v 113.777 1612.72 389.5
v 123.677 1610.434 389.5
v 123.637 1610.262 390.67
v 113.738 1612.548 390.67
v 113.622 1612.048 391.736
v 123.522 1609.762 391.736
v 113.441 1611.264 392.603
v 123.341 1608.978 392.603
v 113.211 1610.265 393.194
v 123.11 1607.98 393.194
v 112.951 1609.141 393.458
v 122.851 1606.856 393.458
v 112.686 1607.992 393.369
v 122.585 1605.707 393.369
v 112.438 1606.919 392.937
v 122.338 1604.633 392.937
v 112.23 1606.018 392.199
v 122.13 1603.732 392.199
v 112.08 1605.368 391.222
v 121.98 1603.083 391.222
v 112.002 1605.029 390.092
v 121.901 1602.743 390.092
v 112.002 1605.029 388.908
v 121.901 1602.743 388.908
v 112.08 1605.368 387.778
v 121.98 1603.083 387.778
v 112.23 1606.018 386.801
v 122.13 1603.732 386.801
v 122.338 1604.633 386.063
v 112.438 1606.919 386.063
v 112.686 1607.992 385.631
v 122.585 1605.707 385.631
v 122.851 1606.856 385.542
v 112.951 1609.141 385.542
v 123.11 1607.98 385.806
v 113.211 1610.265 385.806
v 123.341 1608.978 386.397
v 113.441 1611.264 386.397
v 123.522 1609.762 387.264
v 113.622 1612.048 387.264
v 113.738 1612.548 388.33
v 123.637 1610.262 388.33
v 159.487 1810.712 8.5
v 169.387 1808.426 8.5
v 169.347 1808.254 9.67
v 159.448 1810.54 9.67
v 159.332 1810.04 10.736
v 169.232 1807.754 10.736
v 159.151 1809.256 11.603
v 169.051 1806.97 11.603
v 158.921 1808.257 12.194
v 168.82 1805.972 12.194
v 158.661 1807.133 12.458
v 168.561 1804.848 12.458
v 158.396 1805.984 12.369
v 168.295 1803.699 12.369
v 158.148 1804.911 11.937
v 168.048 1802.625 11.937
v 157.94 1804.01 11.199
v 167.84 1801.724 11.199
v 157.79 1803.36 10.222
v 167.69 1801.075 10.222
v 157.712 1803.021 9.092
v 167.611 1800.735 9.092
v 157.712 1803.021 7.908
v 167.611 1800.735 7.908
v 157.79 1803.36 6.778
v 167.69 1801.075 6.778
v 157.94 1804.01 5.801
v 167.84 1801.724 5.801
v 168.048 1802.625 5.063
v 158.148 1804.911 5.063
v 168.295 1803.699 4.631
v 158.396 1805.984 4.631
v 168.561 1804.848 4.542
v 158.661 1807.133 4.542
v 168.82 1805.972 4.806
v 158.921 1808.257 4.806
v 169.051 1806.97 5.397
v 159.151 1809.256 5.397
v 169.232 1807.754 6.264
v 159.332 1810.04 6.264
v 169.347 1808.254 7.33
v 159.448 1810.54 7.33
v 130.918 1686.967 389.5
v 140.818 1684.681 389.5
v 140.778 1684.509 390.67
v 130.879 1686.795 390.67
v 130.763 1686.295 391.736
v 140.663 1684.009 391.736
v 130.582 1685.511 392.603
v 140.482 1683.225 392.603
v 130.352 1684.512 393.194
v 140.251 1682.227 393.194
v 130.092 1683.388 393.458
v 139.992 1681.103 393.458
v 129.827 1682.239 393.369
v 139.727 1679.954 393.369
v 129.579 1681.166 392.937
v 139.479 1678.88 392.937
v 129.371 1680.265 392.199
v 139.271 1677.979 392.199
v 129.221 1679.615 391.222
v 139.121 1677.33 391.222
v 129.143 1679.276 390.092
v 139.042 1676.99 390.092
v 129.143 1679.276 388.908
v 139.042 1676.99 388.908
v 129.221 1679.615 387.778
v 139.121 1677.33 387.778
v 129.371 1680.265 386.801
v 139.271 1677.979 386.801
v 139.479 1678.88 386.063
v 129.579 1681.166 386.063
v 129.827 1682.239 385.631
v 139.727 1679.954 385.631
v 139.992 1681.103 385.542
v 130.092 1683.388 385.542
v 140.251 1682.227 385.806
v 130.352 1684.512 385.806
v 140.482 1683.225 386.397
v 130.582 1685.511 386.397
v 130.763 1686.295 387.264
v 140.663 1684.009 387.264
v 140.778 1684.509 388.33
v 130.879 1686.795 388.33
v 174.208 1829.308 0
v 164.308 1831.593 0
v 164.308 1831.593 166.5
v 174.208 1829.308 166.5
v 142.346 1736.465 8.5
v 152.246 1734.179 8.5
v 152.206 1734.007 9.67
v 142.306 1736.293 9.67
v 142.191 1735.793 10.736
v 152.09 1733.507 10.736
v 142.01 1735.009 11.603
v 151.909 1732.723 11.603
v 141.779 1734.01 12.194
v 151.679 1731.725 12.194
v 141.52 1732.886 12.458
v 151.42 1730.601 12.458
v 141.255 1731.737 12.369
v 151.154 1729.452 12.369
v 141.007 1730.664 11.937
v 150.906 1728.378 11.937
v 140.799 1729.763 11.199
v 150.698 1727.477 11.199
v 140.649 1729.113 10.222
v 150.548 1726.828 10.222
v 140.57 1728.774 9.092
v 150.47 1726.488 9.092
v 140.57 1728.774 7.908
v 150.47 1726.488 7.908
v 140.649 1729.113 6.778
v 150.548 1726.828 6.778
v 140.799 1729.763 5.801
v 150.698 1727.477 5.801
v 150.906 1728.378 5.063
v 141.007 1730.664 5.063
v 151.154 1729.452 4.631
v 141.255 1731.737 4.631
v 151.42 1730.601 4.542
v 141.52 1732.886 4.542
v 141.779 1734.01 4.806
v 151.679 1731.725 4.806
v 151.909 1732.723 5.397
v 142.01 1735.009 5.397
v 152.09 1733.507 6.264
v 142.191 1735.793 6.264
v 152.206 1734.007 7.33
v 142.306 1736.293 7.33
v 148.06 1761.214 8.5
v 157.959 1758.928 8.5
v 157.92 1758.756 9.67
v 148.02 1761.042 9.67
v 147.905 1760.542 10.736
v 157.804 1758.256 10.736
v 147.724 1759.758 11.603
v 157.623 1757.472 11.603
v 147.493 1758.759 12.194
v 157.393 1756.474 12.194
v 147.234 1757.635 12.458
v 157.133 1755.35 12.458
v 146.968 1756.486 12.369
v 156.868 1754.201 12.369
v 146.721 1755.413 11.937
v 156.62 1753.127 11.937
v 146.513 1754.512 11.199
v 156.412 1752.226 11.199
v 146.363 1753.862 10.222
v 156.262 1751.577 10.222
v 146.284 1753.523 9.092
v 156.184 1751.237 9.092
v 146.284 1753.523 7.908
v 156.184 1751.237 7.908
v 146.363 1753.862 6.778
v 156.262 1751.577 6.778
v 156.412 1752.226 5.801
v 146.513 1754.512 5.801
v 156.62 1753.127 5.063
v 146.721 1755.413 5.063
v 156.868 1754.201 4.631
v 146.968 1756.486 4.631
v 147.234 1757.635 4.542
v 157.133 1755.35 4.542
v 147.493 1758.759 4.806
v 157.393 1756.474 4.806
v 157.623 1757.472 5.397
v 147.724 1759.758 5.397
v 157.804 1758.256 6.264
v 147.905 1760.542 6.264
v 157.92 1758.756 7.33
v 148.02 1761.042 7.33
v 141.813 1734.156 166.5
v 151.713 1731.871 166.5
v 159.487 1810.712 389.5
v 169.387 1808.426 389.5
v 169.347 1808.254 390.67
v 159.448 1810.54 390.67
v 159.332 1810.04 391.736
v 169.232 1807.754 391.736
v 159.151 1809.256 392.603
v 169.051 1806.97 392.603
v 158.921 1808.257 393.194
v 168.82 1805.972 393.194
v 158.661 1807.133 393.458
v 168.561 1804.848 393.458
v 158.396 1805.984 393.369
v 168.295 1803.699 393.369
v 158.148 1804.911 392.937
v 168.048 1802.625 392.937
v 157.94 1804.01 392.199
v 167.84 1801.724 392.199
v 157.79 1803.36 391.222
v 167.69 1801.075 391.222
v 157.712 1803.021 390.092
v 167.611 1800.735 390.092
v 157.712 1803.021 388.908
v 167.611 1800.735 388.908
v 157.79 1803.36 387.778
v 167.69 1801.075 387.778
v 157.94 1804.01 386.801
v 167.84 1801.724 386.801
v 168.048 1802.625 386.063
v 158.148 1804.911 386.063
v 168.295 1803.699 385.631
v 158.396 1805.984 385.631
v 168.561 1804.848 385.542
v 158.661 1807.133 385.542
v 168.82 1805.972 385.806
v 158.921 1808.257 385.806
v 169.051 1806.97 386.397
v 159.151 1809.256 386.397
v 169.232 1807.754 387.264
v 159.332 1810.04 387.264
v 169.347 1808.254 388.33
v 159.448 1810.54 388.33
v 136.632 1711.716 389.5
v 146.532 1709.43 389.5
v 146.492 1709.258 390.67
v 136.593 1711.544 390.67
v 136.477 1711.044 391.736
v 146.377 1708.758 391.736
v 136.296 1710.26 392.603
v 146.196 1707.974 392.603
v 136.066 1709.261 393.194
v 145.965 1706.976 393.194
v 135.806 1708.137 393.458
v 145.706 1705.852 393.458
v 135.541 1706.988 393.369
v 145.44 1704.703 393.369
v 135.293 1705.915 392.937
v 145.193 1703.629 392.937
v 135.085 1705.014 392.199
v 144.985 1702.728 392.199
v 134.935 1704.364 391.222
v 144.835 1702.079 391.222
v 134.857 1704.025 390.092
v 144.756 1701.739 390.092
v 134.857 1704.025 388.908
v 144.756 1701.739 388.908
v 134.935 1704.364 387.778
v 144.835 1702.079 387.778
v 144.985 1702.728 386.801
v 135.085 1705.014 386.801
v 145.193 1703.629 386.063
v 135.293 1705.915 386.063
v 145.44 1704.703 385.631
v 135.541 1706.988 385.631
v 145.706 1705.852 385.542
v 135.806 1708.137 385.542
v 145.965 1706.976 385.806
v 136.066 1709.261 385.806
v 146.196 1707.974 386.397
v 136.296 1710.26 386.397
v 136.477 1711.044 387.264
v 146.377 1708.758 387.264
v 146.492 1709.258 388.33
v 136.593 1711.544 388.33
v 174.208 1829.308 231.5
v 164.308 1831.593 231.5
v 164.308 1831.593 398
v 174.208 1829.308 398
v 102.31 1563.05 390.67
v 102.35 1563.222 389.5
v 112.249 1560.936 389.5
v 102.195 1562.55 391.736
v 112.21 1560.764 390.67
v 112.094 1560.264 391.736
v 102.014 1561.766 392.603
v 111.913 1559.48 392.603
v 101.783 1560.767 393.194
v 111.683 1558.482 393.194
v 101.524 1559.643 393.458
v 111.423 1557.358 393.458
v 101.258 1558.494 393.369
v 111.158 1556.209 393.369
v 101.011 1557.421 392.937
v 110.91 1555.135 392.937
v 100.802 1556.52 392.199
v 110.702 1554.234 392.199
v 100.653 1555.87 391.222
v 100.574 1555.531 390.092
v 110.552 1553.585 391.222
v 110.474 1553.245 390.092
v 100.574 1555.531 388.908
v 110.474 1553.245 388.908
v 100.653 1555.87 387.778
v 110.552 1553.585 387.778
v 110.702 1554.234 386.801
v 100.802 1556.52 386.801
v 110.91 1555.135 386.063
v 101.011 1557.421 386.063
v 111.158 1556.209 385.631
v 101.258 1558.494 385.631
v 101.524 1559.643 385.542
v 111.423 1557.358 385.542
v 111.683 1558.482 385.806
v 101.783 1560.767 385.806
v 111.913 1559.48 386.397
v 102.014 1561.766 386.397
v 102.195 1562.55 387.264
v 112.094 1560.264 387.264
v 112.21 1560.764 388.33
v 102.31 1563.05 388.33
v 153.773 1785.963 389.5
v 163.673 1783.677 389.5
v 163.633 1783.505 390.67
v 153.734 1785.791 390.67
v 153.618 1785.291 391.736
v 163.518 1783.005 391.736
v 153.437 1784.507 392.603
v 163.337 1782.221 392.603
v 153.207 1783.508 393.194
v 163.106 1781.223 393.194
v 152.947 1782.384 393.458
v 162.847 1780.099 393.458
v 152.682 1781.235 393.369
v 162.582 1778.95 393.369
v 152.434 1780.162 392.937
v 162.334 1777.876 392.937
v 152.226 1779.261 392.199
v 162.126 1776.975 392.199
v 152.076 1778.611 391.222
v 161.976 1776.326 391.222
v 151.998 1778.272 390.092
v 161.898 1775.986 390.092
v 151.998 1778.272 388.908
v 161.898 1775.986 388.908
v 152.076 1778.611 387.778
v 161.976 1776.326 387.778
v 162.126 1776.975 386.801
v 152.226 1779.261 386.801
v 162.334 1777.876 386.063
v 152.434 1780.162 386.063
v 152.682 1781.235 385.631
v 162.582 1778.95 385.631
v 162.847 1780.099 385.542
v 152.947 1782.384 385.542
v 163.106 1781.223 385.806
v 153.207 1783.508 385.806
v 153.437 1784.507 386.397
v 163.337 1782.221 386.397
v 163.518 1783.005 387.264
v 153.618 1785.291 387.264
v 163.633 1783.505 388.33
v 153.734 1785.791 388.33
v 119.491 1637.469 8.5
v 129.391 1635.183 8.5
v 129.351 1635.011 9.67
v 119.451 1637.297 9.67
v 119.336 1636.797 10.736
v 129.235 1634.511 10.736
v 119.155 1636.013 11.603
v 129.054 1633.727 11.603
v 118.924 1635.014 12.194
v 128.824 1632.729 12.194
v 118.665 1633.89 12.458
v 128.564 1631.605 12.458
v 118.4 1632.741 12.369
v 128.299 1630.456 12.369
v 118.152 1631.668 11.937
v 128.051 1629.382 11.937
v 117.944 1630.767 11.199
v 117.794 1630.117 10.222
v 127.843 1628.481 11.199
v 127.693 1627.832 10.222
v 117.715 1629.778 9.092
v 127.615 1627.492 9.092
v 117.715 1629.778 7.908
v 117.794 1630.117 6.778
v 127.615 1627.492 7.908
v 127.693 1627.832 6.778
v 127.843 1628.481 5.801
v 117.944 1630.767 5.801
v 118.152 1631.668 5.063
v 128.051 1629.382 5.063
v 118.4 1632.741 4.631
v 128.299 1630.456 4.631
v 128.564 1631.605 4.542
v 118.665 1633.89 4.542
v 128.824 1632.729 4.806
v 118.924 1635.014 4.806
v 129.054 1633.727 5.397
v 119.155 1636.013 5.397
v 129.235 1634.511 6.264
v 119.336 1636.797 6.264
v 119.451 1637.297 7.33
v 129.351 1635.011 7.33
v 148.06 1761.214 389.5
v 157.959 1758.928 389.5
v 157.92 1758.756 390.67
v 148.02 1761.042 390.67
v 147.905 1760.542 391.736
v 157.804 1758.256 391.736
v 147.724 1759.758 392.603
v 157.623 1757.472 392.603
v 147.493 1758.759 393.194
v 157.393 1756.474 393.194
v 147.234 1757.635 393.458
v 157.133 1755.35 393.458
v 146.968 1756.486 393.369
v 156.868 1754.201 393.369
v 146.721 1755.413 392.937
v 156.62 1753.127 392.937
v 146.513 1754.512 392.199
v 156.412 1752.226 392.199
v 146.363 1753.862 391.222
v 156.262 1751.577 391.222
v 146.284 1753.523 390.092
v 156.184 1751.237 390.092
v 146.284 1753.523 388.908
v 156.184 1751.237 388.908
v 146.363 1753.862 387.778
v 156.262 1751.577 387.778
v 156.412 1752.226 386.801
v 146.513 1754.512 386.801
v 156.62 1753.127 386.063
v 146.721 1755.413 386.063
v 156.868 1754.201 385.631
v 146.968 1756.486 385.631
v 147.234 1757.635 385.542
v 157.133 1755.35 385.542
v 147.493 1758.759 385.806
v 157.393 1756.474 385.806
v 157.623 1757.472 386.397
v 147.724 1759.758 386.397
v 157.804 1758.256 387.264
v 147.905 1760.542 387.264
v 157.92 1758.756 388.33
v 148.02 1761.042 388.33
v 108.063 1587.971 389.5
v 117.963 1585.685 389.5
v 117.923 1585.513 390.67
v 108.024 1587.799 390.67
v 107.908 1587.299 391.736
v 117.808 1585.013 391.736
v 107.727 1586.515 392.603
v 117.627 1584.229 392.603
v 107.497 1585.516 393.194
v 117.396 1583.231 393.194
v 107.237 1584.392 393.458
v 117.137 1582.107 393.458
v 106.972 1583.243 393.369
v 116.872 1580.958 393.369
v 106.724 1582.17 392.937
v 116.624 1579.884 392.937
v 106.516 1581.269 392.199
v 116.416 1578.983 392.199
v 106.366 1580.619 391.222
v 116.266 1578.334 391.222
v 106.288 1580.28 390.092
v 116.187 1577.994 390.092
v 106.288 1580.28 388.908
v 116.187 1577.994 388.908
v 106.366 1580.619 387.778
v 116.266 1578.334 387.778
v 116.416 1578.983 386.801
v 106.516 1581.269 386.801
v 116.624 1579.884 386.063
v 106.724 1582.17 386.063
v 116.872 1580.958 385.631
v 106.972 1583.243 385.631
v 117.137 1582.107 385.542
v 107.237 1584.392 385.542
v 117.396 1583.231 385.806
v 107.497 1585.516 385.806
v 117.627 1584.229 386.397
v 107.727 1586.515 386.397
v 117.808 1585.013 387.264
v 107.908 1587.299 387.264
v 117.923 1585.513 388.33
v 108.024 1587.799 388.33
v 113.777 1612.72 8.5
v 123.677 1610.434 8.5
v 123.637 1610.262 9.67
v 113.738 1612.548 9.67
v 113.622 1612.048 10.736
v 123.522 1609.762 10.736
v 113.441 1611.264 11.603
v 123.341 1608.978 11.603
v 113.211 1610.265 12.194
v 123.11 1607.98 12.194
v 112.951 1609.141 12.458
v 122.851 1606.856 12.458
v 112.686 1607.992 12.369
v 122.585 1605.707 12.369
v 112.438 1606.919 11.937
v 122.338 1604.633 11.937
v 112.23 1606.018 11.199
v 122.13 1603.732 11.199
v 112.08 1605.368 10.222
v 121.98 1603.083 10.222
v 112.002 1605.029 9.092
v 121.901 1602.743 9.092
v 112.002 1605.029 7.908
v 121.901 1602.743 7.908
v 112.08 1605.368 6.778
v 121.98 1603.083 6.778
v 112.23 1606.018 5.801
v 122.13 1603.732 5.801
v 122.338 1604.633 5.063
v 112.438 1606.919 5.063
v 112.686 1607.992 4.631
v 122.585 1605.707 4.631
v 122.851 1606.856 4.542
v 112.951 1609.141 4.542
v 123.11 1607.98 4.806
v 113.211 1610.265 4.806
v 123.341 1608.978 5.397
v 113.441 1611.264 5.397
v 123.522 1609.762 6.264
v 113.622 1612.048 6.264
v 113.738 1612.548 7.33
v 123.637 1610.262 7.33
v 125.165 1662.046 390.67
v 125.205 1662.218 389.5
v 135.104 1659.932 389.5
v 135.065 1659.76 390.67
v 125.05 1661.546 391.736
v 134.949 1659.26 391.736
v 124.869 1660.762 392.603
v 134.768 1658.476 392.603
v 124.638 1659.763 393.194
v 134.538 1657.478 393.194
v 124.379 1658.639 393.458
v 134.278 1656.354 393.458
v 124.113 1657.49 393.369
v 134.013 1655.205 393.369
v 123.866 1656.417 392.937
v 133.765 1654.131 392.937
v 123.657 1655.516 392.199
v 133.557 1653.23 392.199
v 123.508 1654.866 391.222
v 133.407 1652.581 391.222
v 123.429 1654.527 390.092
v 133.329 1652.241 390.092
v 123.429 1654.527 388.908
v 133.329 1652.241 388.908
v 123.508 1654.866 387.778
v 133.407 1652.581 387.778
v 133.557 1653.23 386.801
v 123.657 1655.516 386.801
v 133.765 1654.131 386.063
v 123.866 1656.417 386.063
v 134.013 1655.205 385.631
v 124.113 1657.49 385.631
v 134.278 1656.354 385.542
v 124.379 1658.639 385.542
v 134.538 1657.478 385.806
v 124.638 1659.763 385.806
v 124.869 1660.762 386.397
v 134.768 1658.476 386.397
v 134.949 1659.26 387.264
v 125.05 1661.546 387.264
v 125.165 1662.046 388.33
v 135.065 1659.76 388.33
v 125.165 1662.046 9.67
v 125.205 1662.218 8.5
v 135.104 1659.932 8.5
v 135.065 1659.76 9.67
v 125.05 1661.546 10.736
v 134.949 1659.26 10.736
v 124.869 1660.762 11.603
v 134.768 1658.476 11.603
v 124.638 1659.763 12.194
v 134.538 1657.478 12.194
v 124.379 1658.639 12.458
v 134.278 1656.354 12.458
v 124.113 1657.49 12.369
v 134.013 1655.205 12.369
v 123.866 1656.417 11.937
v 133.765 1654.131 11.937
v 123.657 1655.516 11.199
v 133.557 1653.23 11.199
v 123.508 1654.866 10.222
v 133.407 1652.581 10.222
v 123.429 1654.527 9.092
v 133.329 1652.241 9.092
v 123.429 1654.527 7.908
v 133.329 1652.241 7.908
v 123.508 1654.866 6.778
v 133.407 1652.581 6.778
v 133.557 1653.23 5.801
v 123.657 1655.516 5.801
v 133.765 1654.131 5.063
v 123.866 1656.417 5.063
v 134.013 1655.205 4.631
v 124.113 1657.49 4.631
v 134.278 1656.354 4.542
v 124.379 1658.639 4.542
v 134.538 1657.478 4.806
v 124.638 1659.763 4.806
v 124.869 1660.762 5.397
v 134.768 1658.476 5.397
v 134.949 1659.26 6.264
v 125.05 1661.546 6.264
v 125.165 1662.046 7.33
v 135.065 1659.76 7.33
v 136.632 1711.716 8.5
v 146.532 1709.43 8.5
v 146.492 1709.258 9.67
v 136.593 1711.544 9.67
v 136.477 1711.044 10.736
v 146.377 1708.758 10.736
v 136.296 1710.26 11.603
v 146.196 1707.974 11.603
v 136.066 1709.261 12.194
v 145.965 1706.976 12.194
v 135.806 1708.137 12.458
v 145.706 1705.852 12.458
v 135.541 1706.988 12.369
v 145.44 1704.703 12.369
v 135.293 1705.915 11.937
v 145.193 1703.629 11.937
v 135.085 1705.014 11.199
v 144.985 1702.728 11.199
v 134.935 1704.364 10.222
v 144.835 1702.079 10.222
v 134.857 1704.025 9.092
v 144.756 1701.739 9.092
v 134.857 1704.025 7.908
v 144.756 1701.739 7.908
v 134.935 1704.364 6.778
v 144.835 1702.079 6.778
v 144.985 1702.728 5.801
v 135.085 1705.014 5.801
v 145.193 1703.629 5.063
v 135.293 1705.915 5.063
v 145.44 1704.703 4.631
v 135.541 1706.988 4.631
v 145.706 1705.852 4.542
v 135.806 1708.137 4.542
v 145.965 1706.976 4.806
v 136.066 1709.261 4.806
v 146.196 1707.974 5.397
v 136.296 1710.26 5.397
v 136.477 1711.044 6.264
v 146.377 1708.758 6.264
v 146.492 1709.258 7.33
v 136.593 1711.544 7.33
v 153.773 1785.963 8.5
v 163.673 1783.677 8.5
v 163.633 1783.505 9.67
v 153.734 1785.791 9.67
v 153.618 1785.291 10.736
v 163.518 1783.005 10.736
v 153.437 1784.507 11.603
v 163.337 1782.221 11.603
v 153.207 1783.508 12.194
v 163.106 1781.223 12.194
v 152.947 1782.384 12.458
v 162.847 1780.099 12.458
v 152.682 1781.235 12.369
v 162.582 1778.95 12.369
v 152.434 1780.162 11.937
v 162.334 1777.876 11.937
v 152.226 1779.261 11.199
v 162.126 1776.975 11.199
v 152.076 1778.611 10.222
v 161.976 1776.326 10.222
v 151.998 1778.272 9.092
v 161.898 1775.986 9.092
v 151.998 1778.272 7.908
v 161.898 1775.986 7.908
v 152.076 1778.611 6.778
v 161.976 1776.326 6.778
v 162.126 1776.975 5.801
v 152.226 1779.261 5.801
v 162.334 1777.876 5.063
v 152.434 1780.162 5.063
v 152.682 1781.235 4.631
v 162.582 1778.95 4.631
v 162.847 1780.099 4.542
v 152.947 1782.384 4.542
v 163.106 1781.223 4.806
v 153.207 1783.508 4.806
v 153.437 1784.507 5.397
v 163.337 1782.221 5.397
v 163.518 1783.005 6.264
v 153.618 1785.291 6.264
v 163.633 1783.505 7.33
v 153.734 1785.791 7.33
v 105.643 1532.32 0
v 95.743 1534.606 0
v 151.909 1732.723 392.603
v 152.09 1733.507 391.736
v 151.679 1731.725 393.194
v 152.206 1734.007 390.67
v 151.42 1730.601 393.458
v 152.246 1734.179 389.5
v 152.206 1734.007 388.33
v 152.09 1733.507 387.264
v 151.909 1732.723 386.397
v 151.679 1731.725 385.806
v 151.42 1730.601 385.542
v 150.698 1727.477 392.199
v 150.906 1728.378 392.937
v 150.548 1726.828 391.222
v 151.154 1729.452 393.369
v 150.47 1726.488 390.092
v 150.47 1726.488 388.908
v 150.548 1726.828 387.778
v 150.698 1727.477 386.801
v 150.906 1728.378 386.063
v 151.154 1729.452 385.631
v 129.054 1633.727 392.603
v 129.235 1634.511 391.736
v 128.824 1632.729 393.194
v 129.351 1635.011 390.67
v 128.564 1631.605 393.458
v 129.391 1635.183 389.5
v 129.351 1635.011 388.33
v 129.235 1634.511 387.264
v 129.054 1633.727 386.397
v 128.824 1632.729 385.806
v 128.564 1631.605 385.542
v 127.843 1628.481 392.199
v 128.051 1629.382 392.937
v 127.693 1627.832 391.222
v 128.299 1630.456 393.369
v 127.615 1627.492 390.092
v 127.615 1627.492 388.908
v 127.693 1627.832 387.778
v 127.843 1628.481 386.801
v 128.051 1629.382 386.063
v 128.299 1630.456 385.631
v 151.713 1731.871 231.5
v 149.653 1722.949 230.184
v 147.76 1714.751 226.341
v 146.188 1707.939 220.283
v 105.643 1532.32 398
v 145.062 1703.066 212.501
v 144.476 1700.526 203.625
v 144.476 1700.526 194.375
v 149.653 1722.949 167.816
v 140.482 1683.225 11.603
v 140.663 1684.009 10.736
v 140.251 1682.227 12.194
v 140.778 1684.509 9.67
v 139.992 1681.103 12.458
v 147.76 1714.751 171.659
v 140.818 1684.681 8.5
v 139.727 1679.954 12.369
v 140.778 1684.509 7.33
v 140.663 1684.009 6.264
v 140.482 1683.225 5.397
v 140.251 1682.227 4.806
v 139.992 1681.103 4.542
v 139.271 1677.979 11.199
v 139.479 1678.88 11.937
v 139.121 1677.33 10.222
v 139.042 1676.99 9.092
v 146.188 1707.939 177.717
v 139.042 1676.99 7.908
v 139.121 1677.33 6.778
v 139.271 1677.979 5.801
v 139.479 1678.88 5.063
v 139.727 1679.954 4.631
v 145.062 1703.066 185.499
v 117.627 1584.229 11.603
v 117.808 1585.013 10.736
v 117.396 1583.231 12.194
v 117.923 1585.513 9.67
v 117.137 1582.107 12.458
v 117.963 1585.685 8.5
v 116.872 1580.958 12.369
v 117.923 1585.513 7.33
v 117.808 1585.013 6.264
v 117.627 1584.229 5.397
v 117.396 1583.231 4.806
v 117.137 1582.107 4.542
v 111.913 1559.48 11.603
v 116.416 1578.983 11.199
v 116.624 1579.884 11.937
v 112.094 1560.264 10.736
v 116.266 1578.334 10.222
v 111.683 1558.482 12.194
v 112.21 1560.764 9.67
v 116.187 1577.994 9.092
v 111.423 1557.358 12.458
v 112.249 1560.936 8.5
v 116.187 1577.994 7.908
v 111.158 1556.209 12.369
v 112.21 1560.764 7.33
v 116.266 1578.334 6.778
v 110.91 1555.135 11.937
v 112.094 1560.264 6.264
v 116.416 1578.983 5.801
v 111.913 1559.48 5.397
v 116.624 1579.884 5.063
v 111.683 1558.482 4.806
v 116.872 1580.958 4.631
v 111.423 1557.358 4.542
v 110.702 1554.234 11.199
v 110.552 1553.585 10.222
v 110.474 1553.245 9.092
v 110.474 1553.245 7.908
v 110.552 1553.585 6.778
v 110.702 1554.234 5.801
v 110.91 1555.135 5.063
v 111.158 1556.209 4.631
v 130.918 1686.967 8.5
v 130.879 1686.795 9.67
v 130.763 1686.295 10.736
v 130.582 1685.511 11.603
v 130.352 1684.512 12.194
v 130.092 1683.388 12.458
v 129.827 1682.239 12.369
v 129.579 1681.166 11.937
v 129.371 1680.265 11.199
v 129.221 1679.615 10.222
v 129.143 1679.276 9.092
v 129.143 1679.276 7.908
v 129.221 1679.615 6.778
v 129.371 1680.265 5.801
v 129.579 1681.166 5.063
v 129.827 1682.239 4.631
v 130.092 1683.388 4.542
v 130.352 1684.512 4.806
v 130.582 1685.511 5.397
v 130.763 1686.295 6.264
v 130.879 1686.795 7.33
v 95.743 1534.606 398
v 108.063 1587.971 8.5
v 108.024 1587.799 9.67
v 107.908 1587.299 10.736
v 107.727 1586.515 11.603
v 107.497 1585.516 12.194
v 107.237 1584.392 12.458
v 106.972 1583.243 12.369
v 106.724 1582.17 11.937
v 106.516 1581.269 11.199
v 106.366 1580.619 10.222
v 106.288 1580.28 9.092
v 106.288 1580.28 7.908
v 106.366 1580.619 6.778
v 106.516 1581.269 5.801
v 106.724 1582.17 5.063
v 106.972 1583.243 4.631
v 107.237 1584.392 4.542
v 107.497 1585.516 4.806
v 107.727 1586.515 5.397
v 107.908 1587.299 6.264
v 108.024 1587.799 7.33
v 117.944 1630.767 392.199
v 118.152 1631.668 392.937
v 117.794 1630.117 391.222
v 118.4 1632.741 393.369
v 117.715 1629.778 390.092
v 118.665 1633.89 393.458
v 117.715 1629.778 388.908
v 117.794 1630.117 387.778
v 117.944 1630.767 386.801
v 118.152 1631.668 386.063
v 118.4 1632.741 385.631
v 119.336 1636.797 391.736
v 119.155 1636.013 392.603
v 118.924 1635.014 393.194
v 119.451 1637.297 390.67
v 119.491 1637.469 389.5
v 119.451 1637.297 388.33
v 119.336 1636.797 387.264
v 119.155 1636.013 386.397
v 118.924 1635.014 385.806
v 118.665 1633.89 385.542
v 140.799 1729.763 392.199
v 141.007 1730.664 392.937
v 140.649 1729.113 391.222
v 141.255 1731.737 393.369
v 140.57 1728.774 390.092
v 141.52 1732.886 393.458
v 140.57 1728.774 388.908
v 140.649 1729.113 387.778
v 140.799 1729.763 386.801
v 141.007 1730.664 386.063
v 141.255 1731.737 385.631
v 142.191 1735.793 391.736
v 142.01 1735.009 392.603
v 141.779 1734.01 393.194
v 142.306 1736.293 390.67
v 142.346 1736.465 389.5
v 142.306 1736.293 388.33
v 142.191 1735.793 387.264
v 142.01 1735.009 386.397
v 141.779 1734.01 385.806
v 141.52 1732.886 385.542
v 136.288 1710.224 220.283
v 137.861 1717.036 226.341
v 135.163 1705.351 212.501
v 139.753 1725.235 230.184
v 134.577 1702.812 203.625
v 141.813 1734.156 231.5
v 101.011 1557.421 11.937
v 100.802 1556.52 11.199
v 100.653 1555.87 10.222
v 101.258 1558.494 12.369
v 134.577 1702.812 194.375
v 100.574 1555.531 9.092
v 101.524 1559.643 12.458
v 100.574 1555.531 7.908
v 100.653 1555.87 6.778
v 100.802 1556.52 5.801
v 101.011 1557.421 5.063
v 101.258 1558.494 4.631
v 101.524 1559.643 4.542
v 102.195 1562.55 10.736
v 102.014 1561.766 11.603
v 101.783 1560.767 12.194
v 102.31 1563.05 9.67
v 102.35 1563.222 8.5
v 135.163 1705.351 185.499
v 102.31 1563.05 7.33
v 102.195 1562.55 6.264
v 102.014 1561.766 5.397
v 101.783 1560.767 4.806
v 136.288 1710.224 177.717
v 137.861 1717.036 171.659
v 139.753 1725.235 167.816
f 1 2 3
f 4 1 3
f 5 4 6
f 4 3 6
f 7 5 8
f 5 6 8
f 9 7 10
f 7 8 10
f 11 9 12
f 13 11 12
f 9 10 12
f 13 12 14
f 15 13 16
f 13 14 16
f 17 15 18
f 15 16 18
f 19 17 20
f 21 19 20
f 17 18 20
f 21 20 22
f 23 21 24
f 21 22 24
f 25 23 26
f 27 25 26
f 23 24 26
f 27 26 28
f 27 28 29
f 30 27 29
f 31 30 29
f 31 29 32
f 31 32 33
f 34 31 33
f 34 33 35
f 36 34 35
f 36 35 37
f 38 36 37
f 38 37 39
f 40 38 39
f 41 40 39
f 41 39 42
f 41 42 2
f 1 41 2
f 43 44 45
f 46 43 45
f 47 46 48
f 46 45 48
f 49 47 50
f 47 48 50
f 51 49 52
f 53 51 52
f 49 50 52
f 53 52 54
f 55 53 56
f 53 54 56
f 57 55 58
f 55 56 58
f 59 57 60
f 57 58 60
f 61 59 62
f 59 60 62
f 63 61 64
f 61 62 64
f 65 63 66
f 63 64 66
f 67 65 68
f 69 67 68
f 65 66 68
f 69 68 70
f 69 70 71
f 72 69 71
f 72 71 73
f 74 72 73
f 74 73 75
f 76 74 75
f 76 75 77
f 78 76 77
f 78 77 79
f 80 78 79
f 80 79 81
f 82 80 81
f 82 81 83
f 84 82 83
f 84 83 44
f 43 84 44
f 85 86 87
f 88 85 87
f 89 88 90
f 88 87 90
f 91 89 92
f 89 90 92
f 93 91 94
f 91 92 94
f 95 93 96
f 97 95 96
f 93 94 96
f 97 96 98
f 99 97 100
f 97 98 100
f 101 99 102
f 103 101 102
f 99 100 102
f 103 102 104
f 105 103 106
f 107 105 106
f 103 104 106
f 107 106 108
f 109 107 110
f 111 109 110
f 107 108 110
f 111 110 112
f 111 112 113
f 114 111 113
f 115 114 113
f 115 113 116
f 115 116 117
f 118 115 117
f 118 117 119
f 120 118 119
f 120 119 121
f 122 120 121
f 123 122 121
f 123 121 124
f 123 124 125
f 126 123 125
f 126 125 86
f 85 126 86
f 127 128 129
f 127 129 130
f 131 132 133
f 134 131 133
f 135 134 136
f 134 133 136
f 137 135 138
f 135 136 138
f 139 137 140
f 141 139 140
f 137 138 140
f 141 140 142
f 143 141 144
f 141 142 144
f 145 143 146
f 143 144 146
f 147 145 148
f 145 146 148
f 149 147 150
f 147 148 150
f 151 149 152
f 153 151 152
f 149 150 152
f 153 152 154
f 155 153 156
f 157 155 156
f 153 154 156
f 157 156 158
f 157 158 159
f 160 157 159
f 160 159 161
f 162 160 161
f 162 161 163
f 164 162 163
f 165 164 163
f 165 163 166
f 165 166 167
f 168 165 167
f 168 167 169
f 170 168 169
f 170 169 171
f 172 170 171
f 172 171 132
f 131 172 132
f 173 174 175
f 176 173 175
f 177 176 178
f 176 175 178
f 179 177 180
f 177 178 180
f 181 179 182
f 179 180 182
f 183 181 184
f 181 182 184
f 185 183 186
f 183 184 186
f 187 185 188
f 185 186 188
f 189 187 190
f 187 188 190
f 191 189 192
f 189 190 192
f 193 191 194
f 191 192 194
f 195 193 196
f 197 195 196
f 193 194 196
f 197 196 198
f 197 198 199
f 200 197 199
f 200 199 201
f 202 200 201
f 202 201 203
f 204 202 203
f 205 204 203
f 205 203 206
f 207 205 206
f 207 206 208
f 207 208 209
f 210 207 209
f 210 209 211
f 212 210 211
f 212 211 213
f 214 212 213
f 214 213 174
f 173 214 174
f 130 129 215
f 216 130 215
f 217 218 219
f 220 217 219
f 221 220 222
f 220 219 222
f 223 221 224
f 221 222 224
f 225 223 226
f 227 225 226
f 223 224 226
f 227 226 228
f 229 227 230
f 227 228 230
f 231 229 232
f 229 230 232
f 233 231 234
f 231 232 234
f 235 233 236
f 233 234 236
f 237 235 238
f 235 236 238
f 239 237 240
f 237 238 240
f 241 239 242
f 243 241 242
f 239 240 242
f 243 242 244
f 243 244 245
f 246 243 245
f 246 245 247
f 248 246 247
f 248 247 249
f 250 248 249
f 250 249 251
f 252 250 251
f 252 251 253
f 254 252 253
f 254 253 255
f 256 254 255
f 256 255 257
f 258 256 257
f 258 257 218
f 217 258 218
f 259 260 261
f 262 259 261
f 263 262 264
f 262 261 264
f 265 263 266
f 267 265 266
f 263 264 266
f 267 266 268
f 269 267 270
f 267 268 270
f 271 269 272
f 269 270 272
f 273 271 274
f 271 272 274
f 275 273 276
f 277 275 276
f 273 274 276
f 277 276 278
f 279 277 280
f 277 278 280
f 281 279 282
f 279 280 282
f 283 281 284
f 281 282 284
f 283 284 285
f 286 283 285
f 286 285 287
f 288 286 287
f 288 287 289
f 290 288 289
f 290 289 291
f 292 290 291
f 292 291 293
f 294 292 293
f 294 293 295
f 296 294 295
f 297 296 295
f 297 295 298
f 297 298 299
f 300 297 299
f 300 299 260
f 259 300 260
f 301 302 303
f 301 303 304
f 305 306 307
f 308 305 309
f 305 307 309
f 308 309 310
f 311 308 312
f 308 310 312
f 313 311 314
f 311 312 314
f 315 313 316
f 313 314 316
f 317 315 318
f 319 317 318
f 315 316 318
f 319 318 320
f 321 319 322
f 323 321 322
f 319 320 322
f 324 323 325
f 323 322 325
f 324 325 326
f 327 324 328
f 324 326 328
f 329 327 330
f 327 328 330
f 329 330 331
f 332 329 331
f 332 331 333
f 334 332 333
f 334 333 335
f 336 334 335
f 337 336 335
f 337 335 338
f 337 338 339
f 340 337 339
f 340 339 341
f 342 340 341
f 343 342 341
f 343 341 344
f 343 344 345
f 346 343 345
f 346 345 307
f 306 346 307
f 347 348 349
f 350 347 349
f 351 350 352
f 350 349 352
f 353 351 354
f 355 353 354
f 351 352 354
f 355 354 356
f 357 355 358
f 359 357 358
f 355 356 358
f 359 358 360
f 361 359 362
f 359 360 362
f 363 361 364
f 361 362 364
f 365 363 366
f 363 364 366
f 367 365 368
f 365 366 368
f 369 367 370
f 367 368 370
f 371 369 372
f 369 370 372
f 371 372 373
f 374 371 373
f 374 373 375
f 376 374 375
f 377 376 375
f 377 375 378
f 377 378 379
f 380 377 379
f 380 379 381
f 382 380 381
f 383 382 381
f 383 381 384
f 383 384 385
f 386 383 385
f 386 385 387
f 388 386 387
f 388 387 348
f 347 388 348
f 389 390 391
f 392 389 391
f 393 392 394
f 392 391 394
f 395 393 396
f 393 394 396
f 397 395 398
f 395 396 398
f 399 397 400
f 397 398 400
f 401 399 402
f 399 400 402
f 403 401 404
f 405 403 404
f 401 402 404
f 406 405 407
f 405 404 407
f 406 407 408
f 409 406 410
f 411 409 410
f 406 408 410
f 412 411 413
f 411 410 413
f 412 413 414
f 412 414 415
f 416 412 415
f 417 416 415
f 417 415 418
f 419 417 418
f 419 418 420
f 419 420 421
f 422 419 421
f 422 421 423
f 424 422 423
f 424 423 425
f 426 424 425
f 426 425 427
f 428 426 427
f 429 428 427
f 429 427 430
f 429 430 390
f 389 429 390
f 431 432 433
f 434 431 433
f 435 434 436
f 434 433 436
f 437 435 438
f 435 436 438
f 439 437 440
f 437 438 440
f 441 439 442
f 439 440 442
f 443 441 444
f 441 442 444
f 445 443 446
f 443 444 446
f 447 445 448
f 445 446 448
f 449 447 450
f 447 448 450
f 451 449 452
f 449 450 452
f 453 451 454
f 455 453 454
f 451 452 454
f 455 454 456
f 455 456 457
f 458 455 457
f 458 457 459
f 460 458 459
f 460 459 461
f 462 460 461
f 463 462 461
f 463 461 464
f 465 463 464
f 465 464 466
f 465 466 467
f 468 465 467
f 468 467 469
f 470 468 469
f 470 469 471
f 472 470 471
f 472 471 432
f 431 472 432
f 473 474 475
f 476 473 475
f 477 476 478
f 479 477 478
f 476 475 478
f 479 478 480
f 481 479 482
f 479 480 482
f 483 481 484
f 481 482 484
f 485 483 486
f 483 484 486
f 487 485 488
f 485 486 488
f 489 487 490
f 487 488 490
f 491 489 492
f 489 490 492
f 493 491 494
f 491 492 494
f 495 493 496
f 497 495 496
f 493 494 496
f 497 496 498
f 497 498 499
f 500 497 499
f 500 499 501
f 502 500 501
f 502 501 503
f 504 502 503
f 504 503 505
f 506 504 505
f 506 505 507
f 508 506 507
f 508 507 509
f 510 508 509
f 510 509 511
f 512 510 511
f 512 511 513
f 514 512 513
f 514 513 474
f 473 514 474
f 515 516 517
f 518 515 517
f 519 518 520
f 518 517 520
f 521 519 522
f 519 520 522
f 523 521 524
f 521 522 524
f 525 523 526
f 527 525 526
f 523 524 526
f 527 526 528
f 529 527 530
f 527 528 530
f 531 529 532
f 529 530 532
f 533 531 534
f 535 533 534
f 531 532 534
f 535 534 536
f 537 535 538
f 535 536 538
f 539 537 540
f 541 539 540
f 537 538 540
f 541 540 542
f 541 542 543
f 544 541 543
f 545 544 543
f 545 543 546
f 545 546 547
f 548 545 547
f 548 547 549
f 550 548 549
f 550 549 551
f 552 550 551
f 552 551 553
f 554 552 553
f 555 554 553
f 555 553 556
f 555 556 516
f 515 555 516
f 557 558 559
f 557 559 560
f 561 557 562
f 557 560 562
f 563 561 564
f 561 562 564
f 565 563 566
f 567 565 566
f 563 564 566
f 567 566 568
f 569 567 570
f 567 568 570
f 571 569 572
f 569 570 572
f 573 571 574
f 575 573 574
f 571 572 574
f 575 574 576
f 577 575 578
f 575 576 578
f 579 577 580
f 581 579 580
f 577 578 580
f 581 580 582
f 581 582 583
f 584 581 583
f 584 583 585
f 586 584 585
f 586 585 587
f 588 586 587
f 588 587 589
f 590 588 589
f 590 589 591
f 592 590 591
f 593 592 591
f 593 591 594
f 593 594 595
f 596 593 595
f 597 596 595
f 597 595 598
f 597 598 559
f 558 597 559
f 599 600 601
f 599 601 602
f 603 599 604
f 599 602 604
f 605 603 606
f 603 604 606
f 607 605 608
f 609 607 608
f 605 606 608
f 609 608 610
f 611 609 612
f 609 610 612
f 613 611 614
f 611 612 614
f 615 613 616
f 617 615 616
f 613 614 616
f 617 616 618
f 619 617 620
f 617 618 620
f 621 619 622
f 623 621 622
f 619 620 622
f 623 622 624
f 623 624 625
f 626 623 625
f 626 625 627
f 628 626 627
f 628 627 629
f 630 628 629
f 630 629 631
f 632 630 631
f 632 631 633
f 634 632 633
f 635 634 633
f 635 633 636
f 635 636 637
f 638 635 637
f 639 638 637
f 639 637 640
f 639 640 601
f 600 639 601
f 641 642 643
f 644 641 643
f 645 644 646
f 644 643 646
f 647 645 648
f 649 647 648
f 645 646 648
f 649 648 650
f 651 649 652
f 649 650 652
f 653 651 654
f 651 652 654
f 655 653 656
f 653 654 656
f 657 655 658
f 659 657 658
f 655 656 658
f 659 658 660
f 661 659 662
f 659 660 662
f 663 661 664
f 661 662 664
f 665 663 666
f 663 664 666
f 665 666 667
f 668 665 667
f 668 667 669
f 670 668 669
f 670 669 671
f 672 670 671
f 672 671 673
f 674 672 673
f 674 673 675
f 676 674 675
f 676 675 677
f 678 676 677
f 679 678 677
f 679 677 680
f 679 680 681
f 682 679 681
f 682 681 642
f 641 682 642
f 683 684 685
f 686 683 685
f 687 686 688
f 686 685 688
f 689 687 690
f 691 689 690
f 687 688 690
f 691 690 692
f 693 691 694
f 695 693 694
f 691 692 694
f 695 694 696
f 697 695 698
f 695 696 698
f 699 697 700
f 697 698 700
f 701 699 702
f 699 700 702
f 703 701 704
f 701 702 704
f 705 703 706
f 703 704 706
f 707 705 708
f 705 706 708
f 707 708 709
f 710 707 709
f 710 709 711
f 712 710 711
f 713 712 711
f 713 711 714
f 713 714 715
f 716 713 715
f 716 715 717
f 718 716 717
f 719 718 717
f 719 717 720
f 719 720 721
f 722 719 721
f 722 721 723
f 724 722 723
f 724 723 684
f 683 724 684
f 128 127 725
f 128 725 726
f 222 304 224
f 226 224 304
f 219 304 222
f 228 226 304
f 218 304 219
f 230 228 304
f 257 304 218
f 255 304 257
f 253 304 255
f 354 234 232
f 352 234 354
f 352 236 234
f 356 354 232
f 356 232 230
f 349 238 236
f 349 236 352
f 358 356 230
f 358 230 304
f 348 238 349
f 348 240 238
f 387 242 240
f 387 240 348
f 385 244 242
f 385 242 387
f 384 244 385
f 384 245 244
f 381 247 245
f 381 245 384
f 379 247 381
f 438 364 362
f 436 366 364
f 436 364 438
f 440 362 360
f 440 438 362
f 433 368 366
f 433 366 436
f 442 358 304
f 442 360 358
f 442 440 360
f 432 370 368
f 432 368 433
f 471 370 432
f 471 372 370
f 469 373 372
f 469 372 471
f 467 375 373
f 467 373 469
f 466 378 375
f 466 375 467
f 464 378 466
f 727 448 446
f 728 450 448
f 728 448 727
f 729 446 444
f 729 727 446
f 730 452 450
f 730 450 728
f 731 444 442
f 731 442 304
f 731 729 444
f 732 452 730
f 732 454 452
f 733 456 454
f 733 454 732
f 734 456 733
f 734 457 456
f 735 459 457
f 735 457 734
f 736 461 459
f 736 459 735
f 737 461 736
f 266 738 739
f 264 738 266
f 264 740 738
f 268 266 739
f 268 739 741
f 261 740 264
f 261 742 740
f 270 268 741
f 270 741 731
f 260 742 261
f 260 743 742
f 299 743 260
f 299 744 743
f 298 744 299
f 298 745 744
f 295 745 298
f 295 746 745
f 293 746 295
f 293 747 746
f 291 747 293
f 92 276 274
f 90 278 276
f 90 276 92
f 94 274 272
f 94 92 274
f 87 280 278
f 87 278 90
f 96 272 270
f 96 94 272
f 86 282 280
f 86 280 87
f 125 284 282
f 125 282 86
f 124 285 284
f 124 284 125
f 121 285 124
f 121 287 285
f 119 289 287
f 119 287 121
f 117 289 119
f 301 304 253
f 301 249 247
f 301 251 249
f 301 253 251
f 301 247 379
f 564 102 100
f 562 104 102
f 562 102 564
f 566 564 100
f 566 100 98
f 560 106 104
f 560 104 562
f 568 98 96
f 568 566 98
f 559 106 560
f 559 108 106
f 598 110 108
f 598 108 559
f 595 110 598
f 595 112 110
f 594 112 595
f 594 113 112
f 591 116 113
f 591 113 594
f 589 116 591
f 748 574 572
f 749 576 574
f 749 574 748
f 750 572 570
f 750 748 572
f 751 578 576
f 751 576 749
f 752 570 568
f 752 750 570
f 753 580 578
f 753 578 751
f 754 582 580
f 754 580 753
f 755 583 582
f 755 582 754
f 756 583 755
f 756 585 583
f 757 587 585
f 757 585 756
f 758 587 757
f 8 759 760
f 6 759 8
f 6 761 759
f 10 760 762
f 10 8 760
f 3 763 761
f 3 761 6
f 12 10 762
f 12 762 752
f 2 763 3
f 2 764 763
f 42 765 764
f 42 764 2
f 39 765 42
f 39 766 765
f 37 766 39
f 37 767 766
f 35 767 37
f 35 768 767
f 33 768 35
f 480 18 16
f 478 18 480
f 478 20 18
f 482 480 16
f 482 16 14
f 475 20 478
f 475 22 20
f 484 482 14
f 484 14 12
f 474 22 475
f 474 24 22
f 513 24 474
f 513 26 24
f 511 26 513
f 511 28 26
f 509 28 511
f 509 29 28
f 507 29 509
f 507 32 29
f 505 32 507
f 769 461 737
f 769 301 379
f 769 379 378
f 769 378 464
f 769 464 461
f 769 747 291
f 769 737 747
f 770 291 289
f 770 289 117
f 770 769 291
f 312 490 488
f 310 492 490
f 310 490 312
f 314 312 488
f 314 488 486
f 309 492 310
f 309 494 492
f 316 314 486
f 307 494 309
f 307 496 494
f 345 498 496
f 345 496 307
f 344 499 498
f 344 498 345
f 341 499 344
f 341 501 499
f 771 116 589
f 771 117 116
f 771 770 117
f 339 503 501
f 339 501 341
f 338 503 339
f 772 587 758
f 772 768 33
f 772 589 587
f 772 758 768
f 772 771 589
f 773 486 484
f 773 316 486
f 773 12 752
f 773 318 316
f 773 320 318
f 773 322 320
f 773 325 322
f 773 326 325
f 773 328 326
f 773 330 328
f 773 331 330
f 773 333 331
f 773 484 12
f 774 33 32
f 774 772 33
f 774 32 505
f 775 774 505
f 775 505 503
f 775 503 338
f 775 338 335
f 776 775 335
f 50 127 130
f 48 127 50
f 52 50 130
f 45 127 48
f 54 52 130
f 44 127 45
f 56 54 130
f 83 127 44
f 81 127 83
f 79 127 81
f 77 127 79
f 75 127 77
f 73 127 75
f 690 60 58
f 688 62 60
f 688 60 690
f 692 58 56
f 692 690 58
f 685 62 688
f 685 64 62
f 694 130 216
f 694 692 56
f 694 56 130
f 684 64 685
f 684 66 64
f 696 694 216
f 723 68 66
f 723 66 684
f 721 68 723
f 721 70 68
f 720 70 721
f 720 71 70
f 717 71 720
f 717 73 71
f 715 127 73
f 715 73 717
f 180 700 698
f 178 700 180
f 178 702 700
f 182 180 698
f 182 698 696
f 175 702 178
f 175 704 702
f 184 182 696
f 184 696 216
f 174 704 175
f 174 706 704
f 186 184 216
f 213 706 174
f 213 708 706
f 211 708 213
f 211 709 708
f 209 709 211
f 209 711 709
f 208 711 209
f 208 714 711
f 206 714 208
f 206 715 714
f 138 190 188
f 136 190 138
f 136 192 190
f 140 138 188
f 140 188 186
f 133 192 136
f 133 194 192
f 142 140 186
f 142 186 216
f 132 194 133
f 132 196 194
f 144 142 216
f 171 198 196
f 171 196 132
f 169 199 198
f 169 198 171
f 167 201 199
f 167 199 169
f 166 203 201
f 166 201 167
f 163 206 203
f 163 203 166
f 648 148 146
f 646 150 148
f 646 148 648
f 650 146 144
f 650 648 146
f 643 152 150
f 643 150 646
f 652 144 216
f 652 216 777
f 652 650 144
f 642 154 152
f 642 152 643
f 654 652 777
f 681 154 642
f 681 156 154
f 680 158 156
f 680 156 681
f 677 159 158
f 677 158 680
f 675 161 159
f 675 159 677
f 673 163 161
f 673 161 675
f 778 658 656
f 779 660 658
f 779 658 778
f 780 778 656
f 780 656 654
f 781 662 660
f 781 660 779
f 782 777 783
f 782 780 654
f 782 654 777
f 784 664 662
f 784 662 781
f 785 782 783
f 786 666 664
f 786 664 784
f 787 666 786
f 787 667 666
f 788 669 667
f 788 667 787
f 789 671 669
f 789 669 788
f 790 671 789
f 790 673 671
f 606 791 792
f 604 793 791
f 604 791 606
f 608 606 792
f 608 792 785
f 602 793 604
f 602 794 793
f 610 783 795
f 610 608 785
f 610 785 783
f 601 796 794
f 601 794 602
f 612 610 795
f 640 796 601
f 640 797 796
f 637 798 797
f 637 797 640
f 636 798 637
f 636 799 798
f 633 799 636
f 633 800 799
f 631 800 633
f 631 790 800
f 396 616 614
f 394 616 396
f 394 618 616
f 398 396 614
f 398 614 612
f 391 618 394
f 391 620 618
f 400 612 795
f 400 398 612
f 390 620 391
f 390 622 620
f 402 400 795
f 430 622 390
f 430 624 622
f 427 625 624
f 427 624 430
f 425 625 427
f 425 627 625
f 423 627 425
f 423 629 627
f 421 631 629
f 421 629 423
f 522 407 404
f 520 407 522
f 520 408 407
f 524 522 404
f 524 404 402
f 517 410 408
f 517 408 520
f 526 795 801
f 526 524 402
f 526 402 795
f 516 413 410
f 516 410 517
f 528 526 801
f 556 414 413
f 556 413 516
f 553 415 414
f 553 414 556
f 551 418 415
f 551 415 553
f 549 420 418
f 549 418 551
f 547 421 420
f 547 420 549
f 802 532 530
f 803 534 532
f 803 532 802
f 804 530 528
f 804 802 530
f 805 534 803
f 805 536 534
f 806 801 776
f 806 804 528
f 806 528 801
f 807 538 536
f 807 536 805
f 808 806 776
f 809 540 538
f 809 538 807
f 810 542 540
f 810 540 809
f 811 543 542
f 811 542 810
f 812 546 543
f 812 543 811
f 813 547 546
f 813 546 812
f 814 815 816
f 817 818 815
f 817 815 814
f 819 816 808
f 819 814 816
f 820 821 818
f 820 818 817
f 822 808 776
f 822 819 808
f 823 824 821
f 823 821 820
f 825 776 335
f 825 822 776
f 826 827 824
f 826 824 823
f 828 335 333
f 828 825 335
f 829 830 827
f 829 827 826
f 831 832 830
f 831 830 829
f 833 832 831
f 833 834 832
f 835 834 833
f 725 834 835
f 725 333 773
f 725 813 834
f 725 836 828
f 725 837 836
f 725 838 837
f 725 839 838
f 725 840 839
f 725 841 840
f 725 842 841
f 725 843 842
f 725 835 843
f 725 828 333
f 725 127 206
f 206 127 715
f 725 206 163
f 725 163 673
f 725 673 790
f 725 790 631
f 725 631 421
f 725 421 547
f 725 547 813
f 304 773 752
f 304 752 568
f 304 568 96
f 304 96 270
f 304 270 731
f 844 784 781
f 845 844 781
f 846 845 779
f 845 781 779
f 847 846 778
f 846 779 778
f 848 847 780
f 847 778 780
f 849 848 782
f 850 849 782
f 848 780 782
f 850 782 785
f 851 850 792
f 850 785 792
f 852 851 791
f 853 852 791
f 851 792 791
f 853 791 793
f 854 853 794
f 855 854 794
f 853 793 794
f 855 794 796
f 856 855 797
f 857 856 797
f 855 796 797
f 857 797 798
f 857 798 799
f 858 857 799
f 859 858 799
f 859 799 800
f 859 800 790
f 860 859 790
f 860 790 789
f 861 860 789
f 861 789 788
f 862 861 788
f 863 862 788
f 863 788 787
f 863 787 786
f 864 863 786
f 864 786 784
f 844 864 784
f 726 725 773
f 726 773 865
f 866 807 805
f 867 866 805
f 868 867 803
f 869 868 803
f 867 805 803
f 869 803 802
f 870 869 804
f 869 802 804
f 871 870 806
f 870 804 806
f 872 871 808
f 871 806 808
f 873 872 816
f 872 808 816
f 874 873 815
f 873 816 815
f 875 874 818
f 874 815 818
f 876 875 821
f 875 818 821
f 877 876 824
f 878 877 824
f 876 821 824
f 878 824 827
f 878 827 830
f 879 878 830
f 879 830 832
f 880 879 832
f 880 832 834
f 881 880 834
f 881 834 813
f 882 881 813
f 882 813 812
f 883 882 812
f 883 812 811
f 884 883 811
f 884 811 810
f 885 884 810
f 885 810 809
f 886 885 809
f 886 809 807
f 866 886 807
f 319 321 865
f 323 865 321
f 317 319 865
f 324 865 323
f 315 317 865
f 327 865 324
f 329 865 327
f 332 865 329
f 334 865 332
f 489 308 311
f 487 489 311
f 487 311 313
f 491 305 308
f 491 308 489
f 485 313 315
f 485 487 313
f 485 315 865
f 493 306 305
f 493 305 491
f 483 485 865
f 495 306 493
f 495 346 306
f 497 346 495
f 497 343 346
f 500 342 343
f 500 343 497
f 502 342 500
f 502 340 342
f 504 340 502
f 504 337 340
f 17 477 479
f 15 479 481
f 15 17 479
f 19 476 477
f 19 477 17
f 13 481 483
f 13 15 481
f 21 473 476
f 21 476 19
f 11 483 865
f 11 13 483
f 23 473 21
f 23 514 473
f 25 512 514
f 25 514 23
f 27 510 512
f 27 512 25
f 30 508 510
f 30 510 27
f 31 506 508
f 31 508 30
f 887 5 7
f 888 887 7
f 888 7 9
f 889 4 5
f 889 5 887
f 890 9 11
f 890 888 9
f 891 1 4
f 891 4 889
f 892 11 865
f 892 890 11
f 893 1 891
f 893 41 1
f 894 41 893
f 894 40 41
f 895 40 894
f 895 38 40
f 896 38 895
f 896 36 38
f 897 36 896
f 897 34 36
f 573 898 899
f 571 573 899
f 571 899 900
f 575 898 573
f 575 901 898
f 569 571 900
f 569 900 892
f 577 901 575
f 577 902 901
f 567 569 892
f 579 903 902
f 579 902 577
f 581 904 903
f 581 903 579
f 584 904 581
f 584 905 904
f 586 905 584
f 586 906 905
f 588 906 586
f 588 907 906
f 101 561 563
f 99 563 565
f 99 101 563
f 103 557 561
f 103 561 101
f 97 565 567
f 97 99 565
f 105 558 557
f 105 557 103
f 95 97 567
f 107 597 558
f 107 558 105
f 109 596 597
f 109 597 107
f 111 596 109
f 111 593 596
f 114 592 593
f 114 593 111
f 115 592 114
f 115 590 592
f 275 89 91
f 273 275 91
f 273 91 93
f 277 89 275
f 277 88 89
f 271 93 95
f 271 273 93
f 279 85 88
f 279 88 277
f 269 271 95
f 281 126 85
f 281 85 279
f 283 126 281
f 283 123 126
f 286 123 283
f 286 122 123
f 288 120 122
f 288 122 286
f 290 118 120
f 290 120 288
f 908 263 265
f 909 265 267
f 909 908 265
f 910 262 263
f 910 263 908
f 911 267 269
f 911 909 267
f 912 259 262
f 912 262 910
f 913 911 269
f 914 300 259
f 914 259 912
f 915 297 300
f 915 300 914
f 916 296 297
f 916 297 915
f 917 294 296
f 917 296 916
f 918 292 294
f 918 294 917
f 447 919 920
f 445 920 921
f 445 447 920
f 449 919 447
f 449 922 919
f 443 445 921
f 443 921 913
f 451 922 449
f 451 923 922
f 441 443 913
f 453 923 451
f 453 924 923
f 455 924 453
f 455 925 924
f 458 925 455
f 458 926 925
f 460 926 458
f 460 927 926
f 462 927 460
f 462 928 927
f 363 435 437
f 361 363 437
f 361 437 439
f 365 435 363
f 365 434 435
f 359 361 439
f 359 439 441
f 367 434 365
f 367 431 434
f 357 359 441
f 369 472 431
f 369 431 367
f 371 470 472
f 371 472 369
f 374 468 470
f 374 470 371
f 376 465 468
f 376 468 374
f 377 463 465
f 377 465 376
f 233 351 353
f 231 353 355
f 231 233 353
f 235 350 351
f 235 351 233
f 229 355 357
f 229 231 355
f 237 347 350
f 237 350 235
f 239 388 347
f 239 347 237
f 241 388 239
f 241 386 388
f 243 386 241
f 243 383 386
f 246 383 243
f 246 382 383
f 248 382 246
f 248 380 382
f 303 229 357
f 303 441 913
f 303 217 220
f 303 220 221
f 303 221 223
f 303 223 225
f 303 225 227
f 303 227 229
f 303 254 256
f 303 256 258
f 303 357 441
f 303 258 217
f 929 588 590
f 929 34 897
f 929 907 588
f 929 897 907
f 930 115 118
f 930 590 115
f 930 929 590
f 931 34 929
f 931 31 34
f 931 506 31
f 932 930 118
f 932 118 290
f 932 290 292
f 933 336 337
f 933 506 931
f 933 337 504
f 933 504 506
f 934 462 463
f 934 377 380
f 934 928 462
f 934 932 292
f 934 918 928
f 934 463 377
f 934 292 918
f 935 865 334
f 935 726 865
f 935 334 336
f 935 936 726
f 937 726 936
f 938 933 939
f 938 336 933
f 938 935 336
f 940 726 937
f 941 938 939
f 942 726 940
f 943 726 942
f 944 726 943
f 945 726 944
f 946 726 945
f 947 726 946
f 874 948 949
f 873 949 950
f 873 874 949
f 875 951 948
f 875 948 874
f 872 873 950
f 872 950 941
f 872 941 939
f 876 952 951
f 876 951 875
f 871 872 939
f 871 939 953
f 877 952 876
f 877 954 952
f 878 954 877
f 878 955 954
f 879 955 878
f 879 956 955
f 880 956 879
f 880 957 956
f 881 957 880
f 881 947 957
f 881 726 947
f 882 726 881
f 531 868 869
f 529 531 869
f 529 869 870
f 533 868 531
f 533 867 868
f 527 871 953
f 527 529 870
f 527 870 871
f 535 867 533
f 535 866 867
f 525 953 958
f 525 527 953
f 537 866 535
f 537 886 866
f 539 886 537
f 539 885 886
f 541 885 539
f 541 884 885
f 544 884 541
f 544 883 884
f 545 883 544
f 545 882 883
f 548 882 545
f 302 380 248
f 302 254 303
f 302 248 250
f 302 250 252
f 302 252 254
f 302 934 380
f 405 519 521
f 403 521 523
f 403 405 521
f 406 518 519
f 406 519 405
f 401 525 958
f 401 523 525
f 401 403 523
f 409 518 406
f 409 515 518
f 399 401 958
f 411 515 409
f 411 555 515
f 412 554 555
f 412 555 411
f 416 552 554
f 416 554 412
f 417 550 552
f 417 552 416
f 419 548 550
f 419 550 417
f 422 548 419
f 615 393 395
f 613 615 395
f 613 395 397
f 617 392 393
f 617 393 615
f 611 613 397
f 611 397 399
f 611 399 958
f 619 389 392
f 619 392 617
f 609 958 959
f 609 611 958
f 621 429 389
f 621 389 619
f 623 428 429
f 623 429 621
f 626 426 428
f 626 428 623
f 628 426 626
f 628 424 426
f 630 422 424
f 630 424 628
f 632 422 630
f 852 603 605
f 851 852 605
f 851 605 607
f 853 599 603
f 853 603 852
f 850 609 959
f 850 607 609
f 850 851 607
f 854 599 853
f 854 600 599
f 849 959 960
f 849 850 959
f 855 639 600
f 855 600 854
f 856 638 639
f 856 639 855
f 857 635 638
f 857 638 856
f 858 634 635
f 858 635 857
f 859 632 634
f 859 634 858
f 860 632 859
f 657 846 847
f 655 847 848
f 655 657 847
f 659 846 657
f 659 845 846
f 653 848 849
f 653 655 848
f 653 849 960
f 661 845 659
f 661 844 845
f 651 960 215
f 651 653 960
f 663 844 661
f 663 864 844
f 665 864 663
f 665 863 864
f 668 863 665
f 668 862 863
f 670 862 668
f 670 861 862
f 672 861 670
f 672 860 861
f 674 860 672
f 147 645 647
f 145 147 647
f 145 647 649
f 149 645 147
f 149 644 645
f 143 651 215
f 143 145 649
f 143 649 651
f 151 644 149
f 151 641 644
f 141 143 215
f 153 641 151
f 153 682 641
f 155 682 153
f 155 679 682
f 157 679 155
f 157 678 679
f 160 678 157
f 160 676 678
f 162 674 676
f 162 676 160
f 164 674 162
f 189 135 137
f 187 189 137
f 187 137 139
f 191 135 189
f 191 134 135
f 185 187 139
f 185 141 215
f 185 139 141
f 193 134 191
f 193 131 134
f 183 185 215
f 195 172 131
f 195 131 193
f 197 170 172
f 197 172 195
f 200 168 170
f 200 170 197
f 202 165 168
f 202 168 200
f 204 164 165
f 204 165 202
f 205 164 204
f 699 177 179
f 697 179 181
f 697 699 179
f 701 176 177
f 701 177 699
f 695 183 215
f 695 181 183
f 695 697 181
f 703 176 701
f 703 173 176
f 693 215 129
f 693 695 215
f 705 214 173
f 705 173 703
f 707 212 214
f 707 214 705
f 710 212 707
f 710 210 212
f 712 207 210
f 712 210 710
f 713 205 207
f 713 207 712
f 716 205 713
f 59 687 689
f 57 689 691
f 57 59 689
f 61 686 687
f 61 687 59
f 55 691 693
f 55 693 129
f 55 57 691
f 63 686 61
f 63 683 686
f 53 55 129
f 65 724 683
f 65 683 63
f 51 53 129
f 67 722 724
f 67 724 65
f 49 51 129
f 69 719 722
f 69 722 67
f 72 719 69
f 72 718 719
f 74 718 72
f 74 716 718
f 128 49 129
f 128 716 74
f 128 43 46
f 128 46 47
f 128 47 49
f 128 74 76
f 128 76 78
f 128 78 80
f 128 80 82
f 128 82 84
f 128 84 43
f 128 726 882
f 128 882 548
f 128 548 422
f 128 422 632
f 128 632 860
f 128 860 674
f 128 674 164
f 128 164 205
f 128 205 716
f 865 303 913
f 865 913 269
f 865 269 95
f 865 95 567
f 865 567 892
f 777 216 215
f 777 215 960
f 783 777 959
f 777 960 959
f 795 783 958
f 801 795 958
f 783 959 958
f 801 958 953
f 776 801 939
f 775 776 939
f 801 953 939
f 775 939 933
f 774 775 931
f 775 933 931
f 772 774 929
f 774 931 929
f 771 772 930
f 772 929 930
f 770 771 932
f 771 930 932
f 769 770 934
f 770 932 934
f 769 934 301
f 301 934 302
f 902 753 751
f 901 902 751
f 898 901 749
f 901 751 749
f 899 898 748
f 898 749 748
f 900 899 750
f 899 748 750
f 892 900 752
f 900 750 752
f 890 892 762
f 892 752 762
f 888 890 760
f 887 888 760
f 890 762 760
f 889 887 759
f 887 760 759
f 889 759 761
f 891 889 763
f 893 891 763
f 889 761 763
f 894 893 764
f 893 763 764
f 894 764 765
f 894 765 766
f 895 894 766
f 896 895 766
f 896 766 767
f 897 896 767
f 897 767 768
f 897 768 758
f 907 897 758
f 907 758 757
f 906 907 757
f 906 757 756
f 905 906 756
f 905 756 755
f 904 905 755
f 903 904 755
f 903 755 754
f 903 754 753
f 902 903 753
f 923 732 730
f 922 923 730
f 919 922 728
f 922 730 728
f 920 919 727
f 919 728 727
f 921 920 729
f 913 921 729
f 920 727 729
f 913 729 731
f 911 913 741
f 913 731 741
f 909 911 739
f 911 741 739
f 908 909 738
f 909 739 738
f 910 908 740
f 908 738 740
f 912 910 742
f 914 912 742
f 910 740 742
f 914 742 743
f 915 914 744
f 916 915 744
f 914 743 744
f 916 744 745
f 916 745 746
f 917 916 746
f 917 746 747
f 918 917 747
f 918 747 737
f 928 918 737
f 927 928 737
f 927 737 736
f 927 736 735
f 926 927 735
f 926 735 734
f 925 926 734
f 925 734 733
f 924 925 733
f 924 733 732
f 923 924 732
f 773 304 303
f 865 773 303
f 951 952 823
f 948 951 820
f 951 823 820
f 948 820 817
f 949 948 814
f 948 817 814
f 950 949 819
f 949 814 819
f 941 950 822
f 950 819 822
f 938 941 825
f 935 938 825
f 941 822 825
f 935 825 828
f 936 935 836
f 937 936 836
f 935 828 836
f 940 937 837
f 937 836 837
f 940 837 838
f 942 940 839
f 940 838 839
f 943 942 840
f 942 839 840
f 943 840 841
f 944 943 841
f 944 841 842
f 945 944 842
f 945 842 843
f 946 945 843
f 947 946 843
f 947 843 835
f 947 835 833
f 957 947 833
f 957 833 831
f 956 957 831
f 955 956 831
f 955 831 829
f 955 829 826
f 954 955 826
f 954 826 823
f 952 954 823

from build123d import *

# Parameters (mm, degrees)
BOSS_EXTRUDE1_DEPTH     = 398
CUT_EXTRUDE1_DEPTH      = 1867.759149714
CUT_EXTRUDE1_DEPTH_BACK = 1867.759149714
SKETCH3_R               = 3.96875
CUT_EXTRUDE3_DEPTH      = 1867.759149714


with BuildPart() as part:
    # Sketch1 → Boss-Extrude1 (new body)
    with BuildSketch(Plane.XY):
        Polygon((174.207835311, 1829.307995747), (105.642753947, 1532.32), (95.743154089, 1534.605502712), (164.308235453, 1831.593498459), align=None)
    extrude(amount=BOSS_EXTRUDE1_DEPTH)

    # Sketch2 → Cut-Extrude1 (cut, two sides: drawn at the far end of the back side and taken through both)
    with BuildSketch(Plane(origin=(-235.565521709, 54.384585889, 0), x_dir=(0, 0, -1), z_dir=(0.9743700647852336, -0.2249510543438718, 0)).offset(-CUT_EXTRUDE1_DEPTH_BACK)):
        with BuildLine():
            Line((-231.5, 1721.611186556), (-231.5, 1821.611186556))
            Line((-231.5, 1821.611186556), (-166.5, 1821.611186556))
            Line((-166.5, 1821.611186556), (-166.5, 1721.611186556))
            ThreePointArc((-166.5, 1721.611186556), (-199, 1689.111186556), (-231.5, 1721.611186556))
        make_face()
    extrude(amount=CUT_EXTRUDE1_DEPTH + CUT_EXTRUDE1_DEPTH_BACK, mode=Mode.SUBTRACT)

    # Sketch3 → Cut-Extrude3 (cut, through all)
    with BuildSketch(Plane(origin=(-235.565521709, 54.384585889, 0), x_dir=(0, 0, -1), z_dir=(0.9743700647852336, -0.2249510543438718, 0))):
        with Locations(Location((-389.5, 1669.211186556, 0), (0, 0, 90))):
            Circle(SKETCH3_R)
        with Locations(Location((-389.5, 1694.611186556, 0), (0, 0, 90))):
            Circle(SKETCH3_R)
        with Locations(Location((-389.5, 1720.011186556, 0), (0, 0, 90))):
            Circle(SKETCH3_R)
        with Locations(Location((-389.5, 1745.411186556, 0), (0, 0, 90))):
            Circle(SKETCH3_R)
        with Locations(Location((-389.5, 1770.811186556, 0), (0, 0, 90))):
            Circle(SKETCH3_R)
        with Locations(Location((-389.5, 1796.211186556, 0), (0, 0, 90))):
            Circle(SKETCH3_R)
        with Locations(Location((-389.5, 1542.211186556, 0), (0, 0, 90))):
            Circle(SKETCH3_R)
        with Locations(Location((-389.5, 1567.611186556, 0), (0, 0, 90))):
            Circle(SKETCH3_R)
        with Locations(Location((-389.5, 1593.011186556, 0), (0, 0, 90))):
            Circle(SKETCH3_R)
        with Locations(Location((-389.5, 1618.411186556, 0), (0, 0, 90))):
            Circle(SKETCH3_R)
        with Locations(Location((-389.5, 1643.811186556, 0), (0, 0, 90))):
            Circle(SKETCH3_R)
        with Locations(Location((-8.5, 1643.811186556, 0), (0, 0, 90))):
            Circle(SKETCH3_R)
        with Locations(Location((-8.5, 1618.411186556, 0), (0, 0, 90))):
            Circle(SKETCH3_R)
        with Locations(Location((-8.5, 1593.011186556, 0), (0, 0, 90))):
            Circle(SKETCH3_R)
        with Locations(Location((-8.5, 1567.611186556, 0), (0, 0, 90))):
            Circle(SKETCH3_R)
        with Locations(Location((-8.5, 1542.211186556, 0), (0, 0, 90))):
            Circle(SKETCH3_R)
        with Locations(Location((-8.5, 1796.211186556, 0), (0, 0, 90))):
            Circle(SKETCH3_R)
        with Locations(Location((-8.5, 1770.811186556, 0), (0, 0, 90))):
            Circle(SKETCH3_R)
        with Locations(Location((-8.5, 1745.411186556, 0), (0, 0, 90))):
            Circle(SKETCH3_R)
        with Locations(Location((-8.5, 1720.011186556, 0), (0, 0, 90))):
            Circle(SKETCH3_R)
        with Locations(Location((-8.5, 1694.611186556, 0), (0, 0, 90))):
            Circle(SKETCH3_R)
        with Locations(Location((-8.5, 1669.211186556, 0), (0, 0, 90))):
            Circle(SKETCH3_R)
    extrude(amount=-CUT_EXTRUDE3_DEPTH, mode=Mode.SUBTRACT)


solid = part.part
